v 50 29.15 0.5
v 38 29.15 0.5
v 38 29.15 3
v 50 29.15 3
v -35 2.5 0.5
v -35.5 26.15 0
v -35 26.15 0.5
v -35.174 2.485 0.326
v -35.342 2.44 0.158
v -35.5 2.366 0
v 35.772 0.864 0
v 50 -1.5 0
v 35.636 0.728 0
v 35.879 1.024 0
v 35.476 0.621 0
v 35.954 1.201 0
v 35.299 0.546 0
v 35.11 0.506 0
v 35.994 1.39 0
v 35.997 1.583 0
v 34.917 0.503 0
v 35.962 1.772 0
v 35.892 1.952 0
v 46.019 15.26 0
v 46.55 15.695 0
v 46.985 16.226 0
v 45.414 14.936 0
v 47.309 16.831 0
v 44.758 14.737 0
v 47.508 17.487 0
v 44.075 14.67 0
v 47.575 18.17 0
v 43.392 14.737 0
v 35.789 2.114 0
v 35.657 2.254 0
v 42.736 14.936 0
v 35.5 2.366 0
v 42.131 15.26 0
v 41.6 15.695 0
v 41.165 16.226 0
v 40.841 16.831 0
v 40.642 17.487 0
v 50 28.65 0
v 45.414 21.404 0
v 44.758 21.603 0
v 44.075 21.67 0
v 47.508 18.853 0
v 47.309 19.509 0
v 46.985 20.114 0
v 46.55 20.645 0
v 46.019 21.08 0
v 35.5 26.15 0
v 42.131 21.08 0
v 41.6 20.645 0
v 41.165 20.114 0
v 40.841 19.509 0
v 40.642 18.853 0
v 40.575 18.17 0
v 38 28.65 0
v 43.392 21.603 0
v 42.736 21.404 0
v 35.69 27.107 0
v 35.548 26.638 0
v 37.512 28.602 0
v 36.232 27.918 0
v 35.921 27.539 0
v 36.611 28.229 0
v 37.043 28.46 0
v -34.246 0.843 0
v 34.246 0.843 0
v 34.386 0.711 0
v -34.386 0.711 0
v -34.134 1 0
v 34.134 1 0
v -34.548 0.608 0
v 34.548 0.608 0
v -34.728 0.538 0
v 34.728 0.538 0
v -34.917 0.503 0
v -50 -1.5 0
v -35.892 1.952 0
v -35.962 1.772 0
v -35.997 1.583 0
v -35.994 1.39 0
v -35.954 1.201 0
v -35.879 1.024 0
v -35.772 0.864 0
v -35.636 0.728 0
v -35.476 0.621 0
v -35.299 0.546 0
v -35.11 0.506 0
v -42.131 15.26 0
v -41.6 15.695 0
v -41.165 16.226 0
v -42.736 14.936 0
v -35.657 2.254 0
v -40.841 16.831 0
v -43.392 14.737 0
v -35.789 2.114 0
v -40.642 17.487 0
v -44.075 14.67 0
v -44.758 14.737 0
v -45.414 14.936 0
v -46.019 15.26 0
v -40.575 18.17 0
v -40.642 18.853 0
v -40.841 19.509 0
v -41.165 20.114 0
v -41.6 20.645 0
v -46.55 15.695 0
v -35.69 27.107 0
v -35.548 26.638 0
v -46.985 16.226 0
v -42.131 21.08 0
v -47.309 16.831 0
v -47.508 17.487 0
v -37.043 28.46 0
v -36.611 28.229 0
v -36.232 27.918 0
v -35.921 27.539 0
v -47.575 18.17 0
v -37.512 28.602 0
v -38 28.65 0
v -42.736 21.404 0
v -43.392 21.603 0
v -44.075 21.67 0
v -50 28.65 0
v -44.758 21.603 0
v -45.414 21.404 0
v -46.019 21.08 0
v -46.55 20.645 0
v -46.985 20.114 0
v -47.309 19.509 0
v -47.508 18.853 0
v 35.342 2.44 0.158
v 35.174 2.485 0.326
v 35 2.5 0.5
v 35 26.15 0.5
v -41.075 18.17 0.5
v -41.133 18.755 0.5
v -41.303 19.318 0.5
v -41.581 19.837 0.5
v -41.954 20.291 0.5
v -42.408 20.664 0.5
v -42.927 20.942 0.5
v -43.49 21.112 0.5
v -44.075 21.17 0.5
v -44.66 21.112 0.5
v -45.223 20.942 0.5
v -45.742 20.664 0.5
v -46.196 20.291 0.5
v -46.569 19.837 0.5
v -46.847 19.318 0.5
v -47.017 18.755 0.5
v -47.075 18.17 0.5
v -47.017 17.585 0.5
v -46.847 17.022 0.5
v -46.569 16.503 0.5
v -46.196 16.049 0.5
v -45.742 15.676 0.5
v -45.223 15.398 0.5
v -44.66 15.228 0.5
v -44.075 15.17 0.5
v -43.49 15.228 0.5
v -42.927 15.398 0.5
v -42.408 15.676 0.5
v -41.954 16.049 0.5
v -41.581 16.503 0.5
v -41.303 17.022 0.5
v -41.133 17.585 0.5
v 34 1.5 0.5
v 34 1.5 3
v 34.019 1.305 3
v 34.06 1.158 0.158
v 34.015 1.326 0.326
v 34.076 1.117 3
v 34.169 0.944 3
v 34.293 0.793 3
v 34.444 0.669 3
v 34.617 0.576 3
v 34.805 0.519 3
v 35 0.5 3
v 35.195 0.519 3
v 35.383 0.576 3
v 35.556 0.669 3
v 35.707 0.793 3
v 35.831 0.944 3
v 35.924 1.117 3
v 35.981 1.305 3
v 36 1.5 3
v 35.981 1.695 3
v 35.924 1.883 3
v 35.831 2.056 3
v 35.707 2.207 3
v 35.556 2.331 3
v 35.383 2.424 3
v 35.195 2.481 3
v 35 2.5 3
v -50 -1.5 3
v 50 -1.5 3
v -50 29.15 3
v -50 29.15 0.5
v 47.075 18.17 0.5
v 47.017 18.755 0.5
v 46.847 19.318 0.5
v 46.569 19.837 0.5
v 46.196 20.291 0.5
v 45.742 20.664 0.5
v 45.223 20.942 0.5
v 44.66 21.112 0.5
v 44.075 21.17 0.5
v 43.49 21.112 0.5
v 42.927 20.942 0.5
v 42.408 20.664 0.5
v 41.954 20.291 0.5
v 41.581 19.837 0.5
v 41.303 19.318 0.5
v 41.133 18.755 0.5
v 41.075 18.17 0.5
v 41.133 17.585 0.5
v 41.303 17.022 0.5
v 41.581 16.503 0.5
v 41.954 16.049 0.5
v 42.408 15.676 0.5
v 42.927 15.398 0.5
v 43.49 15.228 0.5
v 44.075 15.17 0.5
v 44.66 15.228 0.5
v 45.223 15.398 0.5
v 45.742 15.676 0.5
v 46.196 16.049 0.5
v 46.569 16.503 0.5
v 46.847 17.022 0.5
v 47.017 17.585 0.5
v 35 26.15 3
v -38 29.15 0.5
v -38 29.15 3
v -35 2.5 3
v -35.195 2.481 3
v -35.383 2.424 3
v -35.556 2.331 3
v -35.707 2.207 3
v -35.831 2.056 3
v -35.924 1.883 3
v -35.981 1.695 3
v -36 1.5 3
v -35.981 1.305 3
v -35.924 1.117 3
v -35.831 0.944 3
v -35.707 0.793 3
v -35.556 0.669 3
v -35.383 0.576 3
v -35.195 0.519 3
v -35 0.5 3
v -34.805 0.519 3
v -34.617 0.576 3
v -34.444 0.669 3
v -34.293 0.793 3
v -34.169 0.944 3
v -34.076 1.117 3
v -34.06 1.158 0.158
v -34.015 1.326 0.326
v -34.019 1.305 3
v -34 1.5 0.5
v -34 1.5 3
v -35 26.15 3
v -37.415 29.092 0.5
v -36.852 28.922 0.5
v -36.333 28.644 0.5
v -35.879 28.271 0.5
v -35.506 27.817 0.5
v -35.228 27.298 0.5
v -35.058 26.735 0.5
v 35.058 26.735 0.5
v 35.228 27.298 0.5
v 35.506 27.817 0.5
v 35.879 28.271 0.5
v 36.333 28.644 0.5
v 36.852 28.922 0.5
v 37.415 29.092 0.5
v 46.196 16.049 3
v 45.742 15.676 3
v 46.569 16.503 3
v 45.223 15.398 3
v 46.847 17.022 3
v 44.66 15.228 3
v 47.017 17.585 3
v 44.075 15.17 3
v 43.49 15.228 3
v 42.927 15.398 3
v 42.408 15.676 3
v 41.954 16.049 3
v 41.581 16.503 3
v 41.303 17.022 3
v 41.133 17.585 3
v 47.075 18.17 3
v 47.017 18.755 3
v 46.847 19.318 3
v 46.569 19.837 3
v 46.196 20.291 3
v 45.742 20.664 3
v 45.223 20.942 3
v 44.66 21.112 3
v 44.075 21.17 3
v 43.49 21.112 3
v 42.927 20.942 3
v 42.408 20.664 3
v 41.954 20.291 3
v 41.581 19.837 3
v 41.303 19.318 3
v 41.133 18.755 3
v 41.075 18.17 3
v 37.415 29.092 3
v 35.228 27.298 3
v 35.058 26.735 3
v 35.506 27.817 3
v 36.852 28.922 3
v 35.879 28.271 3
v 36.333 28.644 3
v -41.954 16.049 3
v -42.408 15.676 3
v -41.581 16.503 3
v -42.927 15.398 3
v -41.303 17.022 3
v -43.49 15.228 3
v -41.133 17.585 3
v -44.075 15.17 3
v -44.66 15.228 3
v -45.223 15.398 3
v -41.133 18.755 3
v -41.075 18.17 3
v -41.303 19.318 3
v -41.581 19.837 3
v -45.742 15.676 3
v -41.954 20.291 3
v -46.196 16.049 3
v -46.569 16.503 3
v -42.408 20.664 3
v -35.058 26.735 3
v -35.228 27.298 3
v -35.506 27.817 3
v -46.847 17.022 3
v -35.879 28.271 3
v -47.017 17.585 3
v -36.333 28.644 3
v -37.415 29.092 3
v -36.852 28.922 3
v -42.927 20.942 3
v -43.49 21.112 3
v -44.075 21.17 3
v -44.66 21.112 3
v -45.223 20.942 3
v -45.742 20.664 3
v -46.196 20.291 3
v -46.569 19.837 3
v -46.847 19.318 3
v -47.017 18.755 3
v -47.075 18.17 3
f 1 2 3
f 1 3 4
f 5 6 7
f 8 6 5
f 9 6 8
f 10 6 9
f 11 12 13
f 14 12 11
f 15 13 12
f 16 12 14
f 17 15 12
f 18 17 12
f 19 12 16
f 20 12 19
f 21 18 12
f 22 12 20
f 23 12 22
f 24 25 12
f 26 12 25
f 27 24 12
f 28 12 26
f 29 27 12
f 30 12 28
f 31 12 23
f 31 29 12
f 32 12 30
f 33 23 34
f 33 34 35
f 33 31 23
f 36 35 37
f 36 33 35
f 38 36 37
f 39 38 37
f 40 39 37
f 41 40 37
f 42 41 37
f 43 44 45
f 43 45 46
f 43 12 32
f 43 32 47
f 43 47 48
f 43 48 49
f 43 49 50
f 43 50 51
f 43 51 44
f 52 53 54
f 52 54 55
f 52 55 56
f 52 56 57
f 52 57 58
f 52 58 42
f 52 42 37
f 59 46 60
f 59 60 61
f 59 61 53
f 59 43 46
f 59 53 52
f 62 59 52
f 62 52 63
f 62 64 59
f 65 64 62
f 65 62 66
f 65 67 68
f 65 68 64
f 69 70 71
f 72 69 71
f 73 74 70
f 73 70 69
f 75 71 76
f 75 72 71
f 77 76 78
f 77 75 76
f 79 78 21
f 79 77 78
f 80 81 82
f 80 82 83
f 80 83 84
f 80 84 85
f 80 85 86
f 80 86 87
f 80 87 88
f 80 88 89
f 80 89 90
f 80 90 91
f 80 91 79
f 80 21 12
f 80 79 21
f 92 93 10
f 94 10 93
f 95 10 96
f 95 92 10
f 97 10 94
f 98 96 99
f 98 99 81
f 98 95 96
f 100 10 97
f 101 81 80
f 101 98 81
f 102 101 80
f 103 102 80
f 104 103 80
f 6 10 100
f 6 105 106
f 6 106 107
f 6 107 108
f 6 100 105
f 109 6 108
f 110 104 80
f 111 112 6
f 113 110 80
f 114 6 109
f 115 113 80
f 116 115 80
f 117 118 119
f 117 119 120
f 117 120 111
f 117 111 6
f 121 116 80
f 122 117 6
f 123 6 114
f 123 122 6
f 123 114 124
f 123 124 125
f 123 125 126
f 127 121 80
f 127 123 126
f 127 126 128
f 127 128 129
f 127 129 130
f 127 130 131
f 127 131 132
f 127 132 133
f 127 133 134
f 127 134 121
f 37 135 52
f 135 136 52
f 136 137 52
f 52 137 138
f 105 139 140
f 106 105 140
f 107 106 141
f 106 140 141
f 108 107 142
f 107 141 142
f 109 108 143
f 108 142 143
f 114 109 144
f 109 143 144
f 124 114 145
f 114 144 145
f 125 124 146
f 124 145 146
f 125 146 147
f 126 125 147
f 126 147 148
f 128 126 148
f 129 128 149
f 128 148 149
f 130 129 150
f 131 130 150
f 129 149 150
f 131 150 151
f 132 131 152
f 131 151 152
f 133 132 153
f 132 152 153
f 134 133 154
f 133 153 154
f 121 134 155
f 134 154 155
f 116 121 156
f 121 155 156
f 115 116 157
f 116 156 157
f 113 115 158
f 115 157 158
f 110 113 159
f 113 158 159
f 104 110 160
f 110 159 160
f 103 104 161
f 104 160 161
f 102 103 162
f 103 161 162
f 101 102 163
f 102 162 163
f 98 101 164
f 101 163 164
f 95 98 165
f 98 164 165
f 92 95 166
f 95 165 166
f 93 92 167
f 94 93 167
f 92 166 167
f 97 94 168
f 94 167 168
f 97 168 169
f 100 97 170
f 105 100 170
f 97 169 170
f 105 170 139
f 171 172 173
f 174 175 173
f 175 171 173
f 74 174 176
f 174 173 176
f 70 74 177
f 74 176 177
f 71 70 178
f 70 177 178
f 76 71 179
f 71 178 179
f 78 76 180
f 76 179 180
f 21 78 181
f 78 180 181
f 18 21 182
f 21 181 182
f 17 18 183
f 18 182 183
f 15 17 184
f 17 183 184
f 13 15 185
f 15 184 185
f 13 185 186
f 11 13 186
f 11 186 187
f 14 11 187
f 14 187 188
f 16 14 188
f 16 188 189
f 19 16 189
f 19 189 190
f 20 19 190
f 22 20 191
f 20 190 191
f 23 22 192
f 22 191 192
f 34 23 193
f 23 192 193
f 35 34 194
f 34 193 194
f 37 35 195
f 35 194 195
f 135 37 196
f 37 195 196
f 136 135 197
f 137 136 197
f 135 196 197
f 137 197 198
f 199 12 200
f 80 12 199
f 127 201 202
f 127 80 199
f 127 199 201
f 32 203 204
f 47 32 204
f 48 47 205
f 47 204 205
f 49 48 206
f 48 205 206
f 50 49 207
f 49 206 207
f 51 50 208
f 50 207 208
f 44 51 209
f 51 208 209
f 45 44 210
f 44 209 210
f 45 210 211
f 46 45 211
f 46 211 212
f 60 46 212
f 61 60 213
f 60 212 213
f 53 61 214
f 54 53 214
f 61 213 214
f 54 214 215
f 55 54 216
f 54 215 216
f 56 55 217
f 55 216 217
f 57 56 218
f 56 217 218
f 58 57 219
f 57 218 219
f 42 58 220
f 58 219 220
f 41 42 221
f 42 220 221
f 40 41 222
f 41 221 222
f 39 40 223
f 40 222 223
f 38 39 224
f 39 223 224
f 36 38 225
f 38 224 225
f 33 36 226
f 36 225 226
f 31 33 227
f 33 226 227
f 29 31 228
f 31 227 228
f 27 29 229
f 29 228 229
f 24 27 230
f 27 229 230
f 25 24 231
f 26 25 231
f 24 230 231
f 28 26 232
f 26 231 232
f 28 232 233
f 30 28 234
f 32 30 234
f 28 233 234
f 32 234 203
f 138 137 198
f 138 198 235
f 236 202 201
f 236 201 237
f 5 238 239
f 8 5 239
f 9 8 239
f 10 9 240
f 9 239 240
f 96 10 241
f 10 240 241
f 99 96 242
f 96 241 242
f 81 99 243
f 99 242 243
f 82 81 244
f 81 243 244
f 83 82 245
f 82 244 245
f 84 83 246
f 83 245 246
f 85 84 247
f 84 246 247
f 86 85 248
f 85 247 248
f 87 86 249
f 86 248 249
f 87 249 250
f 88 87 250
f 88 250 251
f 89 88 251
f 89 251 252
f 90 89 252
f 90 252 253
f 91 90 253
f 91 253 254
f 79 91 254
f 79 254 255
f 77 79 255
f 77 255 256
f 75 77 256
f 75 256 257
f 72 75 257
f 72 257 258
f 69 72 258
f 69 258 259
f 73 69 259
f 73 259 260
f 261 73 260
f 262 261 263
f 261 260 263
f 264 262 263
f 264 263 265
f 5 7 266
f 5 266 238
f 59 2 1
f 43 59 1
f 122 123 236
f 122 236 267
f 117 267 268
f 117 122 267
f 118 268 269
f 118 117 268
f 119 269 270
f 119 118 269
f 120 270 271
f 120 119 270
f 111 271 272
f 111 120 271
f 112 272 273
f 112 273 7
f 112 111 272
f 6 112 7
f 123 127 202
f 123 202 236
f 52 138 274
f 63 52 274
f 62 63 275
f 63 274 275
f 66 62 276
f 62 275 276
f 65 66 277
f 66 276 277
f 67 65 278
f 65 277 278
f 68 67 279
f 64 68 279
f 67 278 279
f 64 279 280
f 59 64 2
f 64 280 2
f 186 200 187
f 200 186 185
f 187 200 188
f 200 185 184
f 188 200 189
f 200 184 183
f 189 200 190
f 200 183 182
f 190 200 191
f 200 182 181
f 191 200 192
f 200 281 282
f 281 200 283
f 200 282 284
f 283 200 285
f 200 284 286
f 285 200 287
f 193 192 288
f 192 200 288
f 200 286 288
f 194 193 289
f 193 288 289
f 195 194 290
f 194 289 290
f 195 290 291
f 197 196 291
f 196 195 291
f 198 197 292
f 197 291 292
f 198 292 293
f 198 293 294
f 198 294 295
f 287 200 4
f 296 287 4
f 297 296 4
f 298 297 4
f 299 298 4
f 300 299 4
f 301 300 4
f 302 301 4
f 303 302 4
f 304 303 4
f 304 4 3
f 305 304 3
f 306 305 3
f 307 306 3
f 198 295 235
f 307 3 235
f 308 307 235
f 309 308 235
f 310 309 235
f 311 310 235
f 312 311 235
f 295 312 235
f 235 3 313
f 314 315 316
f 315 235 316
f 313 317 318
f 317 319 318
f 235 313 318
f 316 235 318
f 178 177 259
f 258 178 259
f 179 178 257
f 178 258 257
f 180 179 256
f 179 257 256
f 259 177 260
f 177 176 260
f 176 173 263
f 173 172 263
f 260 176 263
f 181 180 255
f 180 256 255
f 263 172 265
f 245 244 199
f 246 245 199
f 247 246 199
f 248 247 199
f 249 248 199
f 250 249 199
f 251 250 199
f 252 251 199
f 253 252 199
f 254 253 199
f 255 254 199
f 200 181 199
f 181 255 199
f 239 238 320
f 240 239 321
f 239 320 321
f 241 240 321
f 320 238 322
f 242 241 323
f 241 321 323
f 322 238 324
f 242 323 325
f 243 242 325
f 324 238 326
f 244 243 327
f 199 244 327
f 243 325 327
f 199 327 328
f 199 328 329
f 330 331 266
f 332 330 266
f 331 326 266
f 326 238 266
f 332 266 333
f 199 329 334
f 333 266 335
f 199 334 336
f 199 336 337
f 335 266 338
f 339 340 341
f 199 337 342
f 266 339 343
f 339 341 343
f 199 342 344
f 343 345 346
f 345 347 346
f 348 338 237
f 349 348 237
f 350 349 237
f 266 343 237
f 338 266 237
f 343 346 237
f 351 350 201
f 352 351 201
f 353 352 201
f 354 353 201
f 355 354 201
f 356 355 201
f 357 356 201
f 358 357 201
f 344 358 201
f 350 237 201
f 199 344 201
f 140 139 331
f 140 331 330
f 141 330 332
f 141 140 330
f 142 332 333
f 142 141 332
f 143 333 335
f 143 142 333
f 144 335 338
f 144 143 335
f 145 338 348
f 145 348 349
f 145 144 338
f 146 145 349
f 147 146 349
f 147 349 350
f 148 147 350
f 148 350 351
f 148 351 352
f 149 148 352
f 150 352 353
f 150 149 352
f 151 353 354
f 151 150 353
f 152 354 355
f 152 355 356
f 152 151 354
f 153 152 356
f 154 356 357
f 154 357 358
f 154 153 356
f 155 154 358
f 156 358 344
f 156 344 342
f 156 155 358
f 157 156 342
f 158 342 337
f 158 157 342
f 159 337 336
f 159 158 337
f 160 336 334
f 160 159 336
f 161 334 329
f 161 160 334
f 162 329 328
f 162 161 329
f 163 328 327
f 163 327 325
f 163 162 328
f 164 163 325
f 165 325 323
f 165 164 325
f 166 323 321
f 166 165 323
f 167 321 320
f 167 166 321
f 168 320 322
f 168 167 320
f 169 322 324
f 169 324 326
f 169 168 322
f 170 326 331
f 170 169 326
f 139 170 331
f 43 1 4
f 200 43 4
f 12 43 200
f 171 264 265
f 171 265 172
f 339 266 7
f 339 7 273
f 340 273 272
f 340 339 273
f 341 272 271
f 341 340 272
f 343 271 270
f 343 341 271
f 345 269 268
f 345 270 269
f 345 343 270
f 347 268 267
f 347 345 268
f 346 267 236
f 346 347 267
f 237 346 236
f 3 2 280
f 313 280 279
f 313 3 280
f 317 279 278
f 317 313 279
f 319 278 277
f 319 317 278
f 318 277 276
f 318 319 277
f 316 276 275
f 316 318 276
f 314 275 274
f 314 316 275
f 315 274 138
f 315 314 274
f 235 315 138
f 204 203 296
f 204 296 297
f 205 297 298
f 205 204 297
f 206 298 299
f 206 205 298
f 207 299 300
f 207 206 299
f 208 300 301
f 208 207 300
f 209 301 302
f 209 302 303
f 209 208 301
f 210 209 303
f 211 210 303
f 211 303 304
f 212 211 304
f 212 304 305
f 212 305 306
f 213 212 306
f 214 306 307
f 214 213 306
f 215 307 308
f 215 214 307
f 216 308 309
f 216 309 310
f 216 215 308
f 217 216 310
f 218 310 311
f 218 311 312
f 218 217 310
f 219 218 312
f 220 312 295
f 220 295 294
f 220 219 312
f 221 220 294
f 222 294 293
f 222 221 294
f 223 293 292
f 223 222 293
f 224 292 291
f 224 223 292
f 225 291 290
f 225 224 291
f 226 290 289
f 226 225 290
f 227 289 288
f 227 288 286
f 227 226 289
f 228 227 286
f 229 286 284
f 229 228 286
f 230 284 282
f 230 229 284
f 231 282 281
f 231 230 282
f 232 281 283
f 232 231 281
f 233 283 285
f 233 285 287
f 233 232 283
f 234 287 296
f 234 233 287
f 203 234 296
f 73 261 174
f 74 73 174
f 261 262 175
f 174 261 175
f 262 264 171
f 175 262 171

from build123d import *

# Parameters (mm, degrees)
SKETCH_R     = 3
PAD_DEPTH    = 3
SKETCH001_R  = 1
POCKET_DEPTH = 3.001
FILLET_R     = 3
CHAMFER_SIZE = 0.5


with BuildPart() as part:
    # Sketch → Pad (new body)
    with BuildSketch(Plane.XY):
        Polygon((-35, 29.15), (-35, 1.5), (35, 1.5), (35, 29.15), (50, 29.15), (50, -1.5), (-50, -1.5), (-50, 29.15), align=None)
        with Locations((-44.075, 18.17)):
            Circle(SKETCH_R, mode=Mode.SUBTRACT)
        with Locations((44.075, 18.17)):
            Circle(SKETCH_R, mode=Mode.SUBTRACT)
    extrude(amount=PAD_DEPTH)

    # Sketch001 → Pocket (cut, through all)
    with BuildSketch(Plane.XY.offset(3)):
        with Locations((-35, 1.5)):
            Circle(SKETCH001_R)
        with Locations((35, 1.5)):
            Circle(SKETCH001_R)
    extrude(amount=-POCKET_DEPTH, mode=Mode.SUBTRACT)

    # Fillet
    fillet_edges = [part.edges().sort_by_distance(p)[0] for p in [
        (-35, 29.15, 1.5),
        (35, 29.15, 1.5),
    ]]
    fillet(fillet_edges, radius=FILLET_R)

    # Chamfer
    chamfer_edges = [part.edges().sort_by_distance(p)[0] for p in [
        (0, 1.5, 0),
        (-35, 14.325, 0),
        (35, 14.325, 0),
        (-35.87868, 28.27132, 0),
        (35.87868, 28.27132, 0),
        (-47.075, 18.17, 0),
        (41.075, 18.17, 0),
    ]]
    chamfer(chamfer_edges, length=CHAMFER_SIZE)


solid = part.part
